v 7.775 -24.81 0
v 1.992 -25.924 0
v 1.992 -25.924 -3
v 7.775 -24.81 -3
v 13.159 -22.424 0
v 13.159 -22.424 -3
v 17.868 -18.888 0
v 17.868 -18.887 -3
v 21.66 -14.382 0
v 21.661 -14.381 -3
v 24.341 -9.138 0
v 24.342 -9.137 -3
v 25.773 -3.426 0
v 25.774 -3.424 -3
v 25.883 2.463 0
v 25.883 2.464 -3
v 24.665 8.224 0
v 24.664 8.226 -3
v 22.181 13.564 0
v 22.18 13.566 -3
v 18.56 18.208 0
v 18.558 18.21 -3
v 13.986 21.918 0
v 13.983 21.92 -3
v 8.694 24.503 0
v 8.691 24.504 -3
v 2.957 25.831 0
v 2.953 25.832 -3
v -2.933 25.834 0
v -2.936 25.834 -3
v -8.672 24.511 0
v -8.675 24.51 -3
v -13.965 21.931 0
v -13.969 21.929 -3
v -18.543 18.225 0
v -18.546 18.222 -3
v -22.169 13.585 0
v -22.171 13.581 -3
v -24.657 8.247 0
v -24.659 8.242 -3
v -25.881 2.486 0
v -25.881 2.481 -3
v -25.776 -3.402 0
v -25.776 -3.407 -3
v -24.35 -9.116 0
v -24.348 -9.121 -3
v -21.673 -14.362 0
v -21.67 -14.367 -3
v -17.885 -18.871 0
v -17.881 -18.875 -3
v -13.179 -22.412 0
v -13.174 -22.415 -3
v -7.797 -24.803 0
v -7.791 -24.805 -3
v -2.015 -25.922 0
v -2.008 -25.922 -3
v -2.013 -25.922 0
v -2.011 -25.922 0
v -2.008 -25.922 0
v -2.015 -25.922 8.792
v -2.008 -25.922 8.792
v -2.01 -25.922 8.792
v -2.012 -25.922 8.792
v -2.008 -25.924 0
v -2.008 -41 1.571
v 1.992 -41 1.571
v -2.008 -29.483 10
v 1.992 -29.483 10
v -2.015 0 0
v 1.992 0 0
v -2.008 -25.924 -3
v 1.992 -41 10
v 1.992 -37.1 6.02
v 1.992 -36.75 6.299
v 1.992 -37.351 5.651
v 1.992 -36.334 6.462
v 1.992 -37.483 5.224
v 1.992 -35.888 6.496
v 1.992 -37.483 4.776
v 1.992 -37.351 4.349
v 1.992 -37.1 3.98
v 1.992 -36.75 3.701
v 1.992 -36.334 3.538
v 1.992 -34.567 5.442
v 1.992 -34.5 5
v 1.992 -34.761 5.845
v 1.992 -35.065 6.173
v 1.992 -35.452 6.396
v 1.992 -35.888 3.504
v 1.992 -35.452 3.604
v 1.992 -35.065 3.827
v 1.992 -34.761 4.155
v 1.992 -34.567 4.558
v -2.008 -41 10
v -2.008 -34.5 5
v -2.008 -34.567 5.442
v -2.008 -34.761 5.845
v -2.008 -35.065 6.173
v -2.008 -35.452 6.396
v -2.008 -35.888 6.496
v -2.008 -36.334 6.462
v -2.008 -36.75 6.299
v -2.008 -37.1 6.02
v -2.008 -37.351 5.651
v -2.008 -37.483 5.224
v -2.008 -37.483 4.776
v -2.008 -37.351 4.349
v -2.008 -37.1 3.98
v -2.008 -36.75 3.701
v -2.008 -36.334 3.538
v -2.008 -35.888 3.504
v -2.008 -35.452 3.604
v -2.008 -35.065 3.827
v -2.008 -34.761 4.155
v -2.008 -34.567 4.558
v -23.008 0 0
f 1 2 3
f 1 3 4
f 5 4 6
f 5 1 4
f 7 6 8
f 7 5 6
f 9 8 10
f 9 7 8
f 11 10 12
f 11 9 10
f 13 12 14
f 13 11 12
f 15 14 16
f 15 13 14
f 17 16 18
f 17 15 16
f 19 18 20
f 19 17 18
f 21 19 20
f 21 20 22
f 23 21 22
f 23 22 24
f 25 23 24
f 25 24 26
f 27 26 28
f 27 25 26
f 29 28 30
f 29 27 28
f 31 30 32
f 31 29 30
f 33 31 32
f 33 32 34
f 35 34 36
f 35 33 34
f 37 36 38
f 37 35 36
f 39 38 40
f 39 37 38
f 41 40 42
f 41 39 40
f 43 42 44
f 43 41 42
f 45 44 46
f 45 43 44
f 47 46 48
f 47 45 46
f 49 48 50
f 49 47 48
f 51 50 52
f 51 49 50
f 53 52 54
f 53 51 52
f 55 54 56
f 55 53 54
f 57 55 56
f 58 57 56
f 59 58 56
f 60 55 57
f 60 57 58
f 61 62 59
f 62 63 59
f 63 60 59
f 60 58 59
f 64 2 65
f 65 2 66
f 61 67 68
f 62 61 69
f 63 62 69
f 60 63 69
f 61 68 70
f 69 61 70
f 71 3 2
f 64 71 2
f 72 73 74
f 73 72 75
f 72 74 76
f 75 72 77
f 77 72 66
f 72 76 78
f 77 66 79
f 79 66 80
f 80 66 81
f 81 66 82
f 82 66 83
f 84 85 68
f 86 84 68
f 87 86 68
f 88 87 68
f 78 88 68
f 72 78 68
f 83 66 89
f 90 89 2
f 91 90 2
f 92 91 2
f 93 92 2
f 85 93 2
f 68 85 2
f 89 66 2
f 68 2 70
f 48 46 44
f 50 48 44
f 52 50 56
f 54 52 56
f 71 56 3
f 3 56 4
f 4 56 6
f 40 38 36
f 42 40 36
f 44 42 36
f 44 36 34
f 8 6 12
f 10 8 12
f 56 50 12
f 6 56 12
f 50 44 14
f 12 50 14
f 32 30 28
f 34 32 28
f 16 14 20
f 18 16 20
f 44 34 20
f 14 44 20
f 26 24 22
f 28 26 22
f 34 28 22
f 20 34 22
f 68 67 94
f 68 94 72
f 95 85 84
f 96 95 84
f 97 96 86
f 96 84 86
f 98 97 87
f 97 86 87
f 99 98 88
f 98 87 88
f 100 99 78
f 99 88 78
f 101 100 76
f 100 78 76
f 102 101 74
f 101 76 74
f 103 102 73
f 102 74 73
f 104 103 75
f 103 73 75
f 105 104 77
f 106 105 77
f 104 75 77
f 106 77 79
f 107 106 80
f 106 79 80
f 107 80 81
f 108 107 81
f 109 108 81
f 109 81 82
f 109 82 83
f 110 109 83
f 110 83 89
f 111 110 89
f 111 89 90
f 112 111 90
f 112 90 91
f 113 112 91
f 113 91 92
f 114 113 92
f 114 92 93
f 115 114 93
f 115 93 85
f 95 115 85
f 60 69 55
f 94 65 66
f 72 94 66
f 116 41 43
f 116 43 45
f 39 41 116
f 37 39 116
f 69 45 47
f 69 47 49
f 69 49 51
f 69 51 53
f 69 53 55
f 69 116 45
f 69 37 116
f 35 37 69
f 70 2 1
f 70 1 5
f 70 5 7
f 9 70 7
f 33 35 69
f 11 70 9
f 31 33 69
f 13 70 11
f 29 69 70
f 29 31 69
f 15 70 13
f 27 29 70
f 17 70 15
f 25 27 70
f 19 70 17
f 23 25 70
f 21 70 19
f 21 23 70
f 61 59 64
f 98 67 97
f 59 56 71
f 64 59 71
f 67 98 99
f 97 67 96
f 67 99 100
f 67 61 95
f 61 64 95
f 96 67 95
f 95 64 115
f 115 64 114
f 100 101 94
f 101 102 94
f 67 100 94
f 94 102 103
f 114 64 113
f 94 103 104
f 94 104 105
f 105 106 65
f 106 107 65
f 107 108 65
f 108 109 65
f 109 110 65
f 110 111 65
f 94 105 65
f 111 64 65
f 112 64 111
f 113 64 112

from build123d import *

# Parameters (mm, degrees)
F1_DEPTH  = 3
F3_DEPTH  = 10
F5_DEPTH  = 25
F6_W      = 4.4599839021
F6_H      = 15.0388356149
F6_W_2    = 4
F7_DEPTH  = 3
F8_R      = 1.5
F9_DEPTH  = 25
F11_DEPTH = 25


with BuildPart() as f1:
    # F0 (on Top) → F1 (new body)
    with BuildSketch(Plane.XY):
        with BuildLine():
            Line((1.9915475706, -41), (1.9915475706, -25.9236135266))
            ThreePointArc((1.9915475706, -25.9236135266), (0.0084775482, 25.9999986179), (-2.0084524294, -25.9223092883))
            Line((-2.0084524294, -25.9223092883), (-2.0084524294, -41))
            Line((-2.0084524294, -41), (1.9915475706, -41))
        make_face()
    extrude(amount=-F1_DEPTH)

    # F2 (on face) → F3 (join)
    with BuildSketch(Plane.XY):
        with BuildLine():
            Line((1.9915475706, 0), (-2.0153727382, 0))
            Line((-2.0153727382, 0), (-2.0153727382, -25.9217721756))
            ThreePointArc((-2.0153727382, -25.9217721756), (-2.0119126018, -25.9220409629), (-2.0084524294, -25.9223092883))
            Line((-2.0084524294, -25.9223092883), (-2.0084524294, -41))
            Line((-2.0084524294, -41), (1.9915475706, -41))
            Line((1.9915475706, -41), (1.9915475706, -25.9236135266))
            Line((1.9915475706, -25.9236135266), (1.9915475706, 0))
        make_face()
    extrude(amount=F3_DEPTH)

    # F4 (on face) → F5 (cut)
    with BuildSketch(Plane.YZ.offset(1.9915475706)):
        Polygon((-29.4827464968, 10), (0, 0), (0, 10), align=None)
    extrude(amount=-F5_DEPTH, mode=Mode.SUBTRACT)

    # F6 (on face) → F7 (cut)
    with BuildSketch(Plane(origin=(0, 0, -3), x_dir=(1, 0, 0), z_dir=(0, 0, -1))):
        with Locations((-0.0513555715, 33.4805821925)):
            Rectangle(F6_W, F6_H)
        with Locations((-0.0084524294, 33.4805821925)):
            Rectangle(F6_W_2, F6_H)
    extrude(amount=-F7_DEPTH, mode=Mode.SUBTRACT)

    # F8 (on face) → F9 (cut)
    with BuildSketch(Plane.YZ.offset(1.9915475706)):
        with Locations((-36, 5)):
            Circle(F8_R)
    extrude(amount=-F9_DEPTH, mode=Mode.SUBTRACT)

    # F10 (on face) → F11 (cut)
    with BuildSketch(Plane.YZ.offset(1.9915475706)):
        Polygon((-25.9236135266, -3), (-25.9236135266, 0), (-41, 1.5707125422), (-41, 0), (-25.9611643851, 0), (-25.9611643851, -3), align=None)
    extrude(amount=-F11_DEPTH, mode=Mode.SUBTRACT)


solid = f1.part
